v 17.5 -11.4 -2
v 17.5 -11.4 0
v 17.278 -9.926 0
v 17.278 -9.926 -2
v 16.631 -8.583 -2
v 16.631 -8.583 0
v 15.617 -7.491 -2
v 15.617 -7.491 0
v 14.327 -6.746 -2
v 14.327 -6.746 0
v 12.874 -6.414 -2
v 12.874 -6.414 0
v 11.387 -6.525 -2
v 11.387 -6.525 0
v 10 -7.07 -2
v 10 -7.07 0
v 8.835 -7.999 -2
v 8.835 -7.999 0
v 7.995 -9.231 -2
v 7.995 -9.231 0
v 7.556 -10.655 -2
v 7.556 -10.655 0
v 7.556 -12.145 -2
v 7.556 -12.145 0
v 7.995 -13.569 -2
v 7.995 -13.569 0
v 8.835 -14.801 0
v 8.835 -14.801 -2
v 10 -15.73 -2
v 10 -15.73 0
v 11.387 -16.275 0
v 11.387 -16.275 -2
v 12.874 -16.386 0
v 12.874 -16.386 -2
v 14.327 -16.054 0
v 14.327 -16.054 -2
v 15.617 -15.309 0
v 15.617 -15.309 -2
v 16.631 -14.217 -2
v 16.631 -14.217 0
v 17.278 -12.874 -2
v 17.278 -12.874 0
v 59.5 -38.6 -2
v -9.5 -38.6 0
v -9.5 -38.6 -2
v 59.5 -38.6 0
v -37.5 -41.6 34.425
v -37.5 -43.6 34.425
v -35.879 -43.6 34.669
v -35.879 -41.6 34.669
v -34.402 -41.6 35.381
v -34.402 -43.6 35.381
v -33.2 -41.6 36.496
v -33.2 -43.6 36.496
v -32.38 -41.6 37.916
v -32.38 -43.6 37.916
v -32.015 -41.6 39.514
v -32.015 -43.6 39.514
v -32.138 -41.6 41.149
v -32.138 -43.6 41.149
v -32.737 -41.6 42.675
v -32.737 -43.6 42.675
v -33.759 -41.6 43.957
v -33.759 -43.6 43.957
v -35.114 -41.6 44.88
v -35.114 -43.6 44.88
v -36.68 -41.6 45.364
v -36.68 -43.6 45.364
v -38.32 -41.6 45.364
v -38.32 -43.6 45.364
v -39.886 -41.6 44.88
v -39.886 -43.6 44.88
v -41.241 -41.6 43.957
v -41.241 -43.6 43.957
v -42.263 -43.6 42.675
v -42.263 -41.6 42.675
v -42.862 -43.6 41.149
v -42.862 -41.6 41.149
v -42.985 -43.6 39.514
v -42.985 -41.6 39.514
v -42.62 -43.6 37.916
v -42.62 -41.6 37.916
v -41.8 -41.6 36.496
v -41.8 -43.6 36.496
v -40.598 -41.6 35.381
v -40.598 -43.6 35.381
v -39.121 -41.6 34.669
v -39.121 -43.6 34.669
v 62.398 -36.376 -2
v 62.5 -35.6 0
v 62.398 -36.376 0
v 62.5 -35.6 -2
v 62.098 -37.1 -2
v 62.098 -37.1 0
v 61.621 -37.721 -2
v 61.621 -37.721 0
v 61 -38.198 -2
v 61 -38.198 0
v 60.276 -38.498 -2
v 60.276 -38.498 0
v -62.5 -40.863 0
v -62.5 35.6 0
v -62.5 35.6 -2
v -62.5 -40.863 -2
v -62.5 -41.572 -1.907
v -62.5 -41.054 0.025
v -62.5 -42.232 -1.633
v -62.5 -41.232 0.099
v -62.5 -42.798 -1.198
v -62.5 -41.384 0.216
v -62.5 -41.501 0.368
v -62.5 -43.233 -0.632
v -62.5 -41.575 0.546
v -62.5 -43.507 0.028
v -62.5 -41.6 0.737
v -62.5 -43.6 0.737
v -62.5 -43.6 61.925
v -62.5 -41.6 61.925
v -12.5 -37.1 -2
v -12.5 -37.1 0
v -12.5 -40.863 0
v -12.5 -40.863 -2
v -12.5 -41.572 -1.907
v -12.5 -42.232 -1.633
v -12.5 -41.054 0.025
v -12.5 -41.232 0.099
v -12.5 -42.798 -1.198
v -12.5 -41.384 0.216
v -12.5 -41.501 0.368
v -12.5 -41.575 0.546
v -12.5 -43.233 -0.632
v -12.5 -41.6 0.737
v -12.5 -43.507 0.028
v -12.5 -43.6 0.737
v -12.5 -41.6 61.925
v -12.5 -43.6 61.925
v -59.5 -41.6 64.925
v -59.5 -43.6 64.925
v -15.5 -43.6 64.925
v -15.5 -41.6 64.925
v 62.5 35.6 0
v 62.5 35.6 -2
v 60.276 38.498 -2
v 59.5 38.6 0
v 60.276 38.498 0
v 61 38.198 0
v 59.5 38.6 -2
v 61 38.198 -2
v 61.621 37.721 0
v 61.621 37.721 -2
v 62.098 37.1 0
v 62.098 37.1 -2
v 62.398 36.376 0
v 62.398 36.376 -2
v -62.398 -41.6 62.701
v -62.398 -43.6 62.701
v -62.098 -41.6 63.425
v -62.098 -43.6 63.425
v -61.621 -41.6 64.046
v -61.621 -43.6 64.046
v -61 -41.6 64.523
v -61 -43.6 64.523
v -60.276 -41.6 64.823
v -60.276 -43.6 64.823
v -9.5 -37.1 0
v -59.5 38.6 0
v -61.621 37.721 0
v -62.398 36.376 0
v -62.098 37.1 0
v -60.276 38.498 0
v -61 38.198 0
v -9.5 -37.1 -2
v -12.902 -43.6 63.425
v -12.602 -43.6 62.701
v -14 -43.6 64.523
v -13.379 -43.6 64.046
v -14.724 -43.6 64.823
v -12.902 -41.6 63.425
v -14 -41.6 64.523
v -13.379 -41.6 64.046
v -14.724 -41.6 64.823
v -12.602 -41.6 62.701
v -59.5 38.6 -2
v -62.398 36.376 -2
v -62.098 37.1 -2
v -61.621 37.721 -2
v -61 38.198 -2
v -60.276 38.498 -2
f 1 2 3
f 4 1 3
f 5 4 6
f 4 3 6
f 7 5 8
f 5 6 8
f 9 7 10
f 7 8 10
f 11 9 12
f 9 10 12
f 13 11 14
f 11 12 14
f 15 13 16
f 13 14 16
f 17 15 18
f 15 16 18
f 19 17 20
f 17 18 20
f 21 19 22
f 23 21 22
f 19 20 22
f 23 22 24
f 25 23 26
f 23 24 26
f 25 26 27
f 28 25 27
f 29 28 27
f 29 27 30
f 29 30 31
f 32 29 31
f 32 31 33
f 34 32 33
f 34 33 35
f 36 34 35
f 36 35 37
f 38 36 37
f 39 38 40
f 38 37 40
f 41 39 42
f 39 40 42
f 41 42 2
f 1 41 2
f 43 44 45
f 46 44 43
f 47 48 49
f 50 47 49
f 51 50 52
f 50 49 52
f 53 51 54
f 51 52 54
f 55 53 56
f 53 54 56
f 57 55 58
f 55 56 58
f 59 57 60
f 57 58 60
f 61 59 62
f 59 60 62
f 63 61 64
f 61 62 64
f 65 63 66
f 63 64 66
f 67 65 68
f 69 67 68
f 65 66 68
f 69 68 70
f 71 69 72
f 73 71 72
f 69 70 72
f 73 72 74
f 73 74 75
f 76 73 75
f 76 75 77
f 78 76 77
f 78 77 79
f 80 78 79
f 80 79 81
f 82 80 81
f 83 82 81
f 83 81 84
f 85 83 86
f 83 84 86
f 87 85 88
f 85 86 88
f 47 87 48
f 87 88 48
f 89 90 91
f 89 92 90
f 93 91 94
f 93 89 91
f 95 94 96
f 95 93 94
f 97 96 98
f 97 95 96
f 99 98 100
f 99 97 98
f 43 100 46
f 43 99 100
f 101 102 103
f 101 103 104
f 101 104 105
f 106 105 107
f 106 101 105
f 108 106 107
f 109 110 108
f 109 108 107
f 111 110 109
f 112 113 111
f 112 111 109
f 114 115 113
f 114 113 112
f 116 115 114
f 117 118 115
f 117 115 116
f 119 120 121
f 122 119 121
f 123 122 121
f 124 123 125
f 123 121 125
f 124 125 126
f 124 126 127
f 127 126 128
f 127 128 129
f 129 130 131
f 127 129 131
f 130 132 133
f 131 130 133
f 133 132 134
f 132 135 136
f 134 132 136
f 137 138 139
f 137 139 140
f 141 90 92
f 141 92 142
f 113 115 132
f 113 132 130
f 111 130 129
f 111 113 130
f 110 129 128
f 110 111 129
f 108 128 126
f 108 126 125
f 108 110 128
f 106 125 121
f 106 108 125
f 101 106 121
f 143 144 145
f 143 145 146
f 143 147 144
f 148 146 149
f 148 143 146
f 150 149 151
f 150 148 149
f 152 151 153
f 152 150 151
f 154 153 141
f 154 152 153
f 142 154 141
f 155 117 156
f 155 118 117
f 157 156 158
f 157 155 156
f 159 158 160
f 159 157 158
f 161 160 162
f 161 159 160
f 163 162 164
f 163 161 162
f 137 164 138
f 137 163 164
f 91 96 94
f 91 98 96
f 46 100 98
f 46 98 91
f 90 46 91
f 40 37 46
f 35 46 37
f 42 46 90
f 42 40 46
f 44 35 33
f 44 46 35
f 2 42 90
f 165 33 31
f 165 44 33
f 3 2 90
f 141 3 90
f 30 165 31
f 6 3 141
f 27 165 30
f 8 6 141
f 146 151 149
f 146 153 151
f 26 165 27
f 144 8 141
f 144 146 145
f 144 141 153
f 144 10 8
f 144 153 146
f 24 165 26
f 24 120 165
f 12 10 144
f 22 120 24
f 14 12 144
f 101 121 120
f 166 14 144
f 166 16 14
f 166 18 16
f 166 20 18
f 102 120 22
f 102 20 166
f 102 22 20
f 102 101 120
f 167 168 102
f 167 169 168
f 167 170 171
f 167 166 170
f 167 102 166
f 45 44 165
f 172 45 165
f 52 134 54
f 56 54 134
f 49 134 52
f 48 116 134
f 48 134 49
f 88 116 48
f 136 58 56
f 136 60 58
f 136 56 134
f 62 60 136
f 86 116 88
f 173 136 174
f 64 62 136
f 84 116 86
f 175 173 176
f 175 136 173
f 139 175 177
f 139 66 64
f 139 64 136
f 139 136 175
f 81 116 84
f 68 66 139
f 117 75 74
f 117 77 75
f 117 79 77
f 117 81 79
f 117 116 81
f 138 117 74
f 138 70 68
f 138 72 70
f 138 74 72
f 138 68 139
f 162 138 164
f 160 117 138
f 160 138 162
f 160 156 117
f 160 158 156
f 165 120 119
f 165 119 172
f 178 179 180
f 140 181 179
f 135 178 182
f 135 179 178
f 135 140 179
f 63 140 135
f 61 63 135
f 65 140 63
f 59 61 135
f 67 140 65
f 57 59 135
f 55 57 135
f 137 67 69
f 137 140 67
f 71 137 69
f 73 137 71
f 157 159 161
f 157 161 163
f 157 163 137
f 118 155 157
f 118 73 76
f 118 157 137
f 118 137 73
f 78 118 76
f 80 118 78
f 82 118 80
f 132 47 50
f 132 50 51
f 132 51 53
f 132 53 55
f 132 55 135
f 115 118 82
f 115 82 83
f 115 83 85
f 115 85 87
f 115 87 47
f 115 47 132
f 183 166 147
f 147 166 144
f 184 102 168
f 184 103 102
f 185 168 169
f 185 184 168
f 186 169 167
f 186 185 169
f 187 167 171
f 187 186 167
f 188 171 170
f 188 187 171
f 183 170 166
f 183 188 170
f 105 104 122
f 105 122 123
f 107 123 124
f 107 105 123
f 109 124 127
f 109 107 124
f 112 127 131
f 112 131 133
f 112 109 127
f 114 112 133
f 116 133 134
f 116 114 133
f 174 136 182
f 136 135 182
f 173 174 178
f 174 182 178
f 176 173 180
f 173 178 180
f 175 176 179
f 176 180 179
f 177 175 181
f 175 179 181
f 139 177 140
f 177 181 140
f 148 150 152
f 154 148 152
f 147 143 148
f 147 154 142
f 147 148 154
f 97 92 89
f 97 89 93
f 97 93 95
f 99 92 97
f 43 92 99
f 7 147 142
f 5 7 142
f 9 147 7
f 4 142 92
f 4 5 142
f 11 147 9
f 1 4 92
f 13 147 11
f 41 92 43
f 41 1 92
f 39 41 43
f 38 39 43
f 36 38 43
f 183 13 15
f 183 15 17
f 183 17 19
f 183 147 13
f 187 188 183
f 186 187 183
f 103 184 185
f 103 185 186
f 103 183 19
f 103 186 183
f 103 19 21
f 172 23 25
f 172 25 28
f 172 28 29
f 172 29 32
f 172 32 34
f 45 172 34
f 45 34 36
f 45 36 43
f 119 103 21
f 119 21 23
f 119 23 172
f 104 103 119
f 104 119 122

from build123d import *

# Parameters (mm, degrees)
SKETCH2_W          = 125
SKETCH2_H          = 77.2
BASE_FLANGE1_DEPTH = 2
SKETCH2_3_W        = 3
SKETCH2_3_H        = 1.5
CUT_EXTRUDE1_DEPTH = 2
EDGE_FLANGE1_DEPTH = 50
SKETCH2_4_R        = 5
CUT_EXTRUDE2_DEPTH = 2
SKETCH12_R         = 5.5
CUT_EXTRUDE3_DEPTH = 2
FILLET1_R          = 3


# Sheet-metal steps are written as plain solids
with BuildPart() as part:
    # Sketch2 → Base-Flange1 (new body)
    with BuildSketch(Plane.XY):
        Rectangle(SKETCH2_W, SKETCH2_H)
    extrude(amount=-BASE_FLANGE1_DEPTH)

    # Sketch2<3> → Cut-Extrude1 (cut)
    with BuildSketch(Plane.XY):
        with Locations((-11, -37.85)):
            Rectangle(SKETCH2_3_W, SKETCH2_3_H)
    extrude(amount=-CUT_EXTRUDE1_DEPTH, mode=Mode.SUBTRACT)

    # Edge-Flange1 section (across the edge) → Edge-Flange1 (add)
    with BuildSketch(Plane(origin=(-62.5, -43.6, 0), x_dir=(0, 1, 0), z_dir=(1, 0, 0))):
        with BuildLine():
            Line((0, 0.7366), (0, 64.925))
            Line((0, 64.925), (2, 64.925))
            Line((2, 64.925), (2, 0.7366))
            ThreePointArc((2, 0.7366), (2.215745145, 0.215745145), (2.7366, 0))
            Line((2.7366, 0), (5, 0))
            Line((5, 0), (5, -2))
            Line((5, -2), (2.7366, -2))
            ThreePointArc((2.7366, -2), (0.801531583, -1.198468417), (0, 0.7366))
        make_face()
    extrude(amount=EDGE_FLANGE1_DEPTH)

    # Sketch2<4> → Cut-Extrude2 (cut)
    with BuildSketch(Plane.XY):
        with Locations((12.5, -11.4)):
            Circle(SKETCH2_4_R)
    extrude(amount=-CUT_EXTRUDE2_DEPTH, mode=Mode.SUBTRACT)

    # Sketch12 → Cut-Extrude3 (cut)
    with BuildSketch(Plane.XZ.offset(43.6)):
        with Locations(Location((-37.5, 39.925, 0), (0, 0, 270))):
            Circle(SKETCH12_R)
    extrude(amount=-CUT_EXTRUDE3_DEPTH, mode=Mode.SUBTRACT)

    # Fillet1
    fillet1_edges = [part.edges().sort_by_distance(p)[0] for p in [
        (-62.5, -42.6, 64.925),
        (-12.5, -42.6, 64.925),
        (62.5, 38.6, -1),
        (62.5, -38.6, -1),
        (-62.5, 38.6, -1),
    ]]
    fillet(fillet1_edges, radius=FILLET1_R)


solid = part.part
